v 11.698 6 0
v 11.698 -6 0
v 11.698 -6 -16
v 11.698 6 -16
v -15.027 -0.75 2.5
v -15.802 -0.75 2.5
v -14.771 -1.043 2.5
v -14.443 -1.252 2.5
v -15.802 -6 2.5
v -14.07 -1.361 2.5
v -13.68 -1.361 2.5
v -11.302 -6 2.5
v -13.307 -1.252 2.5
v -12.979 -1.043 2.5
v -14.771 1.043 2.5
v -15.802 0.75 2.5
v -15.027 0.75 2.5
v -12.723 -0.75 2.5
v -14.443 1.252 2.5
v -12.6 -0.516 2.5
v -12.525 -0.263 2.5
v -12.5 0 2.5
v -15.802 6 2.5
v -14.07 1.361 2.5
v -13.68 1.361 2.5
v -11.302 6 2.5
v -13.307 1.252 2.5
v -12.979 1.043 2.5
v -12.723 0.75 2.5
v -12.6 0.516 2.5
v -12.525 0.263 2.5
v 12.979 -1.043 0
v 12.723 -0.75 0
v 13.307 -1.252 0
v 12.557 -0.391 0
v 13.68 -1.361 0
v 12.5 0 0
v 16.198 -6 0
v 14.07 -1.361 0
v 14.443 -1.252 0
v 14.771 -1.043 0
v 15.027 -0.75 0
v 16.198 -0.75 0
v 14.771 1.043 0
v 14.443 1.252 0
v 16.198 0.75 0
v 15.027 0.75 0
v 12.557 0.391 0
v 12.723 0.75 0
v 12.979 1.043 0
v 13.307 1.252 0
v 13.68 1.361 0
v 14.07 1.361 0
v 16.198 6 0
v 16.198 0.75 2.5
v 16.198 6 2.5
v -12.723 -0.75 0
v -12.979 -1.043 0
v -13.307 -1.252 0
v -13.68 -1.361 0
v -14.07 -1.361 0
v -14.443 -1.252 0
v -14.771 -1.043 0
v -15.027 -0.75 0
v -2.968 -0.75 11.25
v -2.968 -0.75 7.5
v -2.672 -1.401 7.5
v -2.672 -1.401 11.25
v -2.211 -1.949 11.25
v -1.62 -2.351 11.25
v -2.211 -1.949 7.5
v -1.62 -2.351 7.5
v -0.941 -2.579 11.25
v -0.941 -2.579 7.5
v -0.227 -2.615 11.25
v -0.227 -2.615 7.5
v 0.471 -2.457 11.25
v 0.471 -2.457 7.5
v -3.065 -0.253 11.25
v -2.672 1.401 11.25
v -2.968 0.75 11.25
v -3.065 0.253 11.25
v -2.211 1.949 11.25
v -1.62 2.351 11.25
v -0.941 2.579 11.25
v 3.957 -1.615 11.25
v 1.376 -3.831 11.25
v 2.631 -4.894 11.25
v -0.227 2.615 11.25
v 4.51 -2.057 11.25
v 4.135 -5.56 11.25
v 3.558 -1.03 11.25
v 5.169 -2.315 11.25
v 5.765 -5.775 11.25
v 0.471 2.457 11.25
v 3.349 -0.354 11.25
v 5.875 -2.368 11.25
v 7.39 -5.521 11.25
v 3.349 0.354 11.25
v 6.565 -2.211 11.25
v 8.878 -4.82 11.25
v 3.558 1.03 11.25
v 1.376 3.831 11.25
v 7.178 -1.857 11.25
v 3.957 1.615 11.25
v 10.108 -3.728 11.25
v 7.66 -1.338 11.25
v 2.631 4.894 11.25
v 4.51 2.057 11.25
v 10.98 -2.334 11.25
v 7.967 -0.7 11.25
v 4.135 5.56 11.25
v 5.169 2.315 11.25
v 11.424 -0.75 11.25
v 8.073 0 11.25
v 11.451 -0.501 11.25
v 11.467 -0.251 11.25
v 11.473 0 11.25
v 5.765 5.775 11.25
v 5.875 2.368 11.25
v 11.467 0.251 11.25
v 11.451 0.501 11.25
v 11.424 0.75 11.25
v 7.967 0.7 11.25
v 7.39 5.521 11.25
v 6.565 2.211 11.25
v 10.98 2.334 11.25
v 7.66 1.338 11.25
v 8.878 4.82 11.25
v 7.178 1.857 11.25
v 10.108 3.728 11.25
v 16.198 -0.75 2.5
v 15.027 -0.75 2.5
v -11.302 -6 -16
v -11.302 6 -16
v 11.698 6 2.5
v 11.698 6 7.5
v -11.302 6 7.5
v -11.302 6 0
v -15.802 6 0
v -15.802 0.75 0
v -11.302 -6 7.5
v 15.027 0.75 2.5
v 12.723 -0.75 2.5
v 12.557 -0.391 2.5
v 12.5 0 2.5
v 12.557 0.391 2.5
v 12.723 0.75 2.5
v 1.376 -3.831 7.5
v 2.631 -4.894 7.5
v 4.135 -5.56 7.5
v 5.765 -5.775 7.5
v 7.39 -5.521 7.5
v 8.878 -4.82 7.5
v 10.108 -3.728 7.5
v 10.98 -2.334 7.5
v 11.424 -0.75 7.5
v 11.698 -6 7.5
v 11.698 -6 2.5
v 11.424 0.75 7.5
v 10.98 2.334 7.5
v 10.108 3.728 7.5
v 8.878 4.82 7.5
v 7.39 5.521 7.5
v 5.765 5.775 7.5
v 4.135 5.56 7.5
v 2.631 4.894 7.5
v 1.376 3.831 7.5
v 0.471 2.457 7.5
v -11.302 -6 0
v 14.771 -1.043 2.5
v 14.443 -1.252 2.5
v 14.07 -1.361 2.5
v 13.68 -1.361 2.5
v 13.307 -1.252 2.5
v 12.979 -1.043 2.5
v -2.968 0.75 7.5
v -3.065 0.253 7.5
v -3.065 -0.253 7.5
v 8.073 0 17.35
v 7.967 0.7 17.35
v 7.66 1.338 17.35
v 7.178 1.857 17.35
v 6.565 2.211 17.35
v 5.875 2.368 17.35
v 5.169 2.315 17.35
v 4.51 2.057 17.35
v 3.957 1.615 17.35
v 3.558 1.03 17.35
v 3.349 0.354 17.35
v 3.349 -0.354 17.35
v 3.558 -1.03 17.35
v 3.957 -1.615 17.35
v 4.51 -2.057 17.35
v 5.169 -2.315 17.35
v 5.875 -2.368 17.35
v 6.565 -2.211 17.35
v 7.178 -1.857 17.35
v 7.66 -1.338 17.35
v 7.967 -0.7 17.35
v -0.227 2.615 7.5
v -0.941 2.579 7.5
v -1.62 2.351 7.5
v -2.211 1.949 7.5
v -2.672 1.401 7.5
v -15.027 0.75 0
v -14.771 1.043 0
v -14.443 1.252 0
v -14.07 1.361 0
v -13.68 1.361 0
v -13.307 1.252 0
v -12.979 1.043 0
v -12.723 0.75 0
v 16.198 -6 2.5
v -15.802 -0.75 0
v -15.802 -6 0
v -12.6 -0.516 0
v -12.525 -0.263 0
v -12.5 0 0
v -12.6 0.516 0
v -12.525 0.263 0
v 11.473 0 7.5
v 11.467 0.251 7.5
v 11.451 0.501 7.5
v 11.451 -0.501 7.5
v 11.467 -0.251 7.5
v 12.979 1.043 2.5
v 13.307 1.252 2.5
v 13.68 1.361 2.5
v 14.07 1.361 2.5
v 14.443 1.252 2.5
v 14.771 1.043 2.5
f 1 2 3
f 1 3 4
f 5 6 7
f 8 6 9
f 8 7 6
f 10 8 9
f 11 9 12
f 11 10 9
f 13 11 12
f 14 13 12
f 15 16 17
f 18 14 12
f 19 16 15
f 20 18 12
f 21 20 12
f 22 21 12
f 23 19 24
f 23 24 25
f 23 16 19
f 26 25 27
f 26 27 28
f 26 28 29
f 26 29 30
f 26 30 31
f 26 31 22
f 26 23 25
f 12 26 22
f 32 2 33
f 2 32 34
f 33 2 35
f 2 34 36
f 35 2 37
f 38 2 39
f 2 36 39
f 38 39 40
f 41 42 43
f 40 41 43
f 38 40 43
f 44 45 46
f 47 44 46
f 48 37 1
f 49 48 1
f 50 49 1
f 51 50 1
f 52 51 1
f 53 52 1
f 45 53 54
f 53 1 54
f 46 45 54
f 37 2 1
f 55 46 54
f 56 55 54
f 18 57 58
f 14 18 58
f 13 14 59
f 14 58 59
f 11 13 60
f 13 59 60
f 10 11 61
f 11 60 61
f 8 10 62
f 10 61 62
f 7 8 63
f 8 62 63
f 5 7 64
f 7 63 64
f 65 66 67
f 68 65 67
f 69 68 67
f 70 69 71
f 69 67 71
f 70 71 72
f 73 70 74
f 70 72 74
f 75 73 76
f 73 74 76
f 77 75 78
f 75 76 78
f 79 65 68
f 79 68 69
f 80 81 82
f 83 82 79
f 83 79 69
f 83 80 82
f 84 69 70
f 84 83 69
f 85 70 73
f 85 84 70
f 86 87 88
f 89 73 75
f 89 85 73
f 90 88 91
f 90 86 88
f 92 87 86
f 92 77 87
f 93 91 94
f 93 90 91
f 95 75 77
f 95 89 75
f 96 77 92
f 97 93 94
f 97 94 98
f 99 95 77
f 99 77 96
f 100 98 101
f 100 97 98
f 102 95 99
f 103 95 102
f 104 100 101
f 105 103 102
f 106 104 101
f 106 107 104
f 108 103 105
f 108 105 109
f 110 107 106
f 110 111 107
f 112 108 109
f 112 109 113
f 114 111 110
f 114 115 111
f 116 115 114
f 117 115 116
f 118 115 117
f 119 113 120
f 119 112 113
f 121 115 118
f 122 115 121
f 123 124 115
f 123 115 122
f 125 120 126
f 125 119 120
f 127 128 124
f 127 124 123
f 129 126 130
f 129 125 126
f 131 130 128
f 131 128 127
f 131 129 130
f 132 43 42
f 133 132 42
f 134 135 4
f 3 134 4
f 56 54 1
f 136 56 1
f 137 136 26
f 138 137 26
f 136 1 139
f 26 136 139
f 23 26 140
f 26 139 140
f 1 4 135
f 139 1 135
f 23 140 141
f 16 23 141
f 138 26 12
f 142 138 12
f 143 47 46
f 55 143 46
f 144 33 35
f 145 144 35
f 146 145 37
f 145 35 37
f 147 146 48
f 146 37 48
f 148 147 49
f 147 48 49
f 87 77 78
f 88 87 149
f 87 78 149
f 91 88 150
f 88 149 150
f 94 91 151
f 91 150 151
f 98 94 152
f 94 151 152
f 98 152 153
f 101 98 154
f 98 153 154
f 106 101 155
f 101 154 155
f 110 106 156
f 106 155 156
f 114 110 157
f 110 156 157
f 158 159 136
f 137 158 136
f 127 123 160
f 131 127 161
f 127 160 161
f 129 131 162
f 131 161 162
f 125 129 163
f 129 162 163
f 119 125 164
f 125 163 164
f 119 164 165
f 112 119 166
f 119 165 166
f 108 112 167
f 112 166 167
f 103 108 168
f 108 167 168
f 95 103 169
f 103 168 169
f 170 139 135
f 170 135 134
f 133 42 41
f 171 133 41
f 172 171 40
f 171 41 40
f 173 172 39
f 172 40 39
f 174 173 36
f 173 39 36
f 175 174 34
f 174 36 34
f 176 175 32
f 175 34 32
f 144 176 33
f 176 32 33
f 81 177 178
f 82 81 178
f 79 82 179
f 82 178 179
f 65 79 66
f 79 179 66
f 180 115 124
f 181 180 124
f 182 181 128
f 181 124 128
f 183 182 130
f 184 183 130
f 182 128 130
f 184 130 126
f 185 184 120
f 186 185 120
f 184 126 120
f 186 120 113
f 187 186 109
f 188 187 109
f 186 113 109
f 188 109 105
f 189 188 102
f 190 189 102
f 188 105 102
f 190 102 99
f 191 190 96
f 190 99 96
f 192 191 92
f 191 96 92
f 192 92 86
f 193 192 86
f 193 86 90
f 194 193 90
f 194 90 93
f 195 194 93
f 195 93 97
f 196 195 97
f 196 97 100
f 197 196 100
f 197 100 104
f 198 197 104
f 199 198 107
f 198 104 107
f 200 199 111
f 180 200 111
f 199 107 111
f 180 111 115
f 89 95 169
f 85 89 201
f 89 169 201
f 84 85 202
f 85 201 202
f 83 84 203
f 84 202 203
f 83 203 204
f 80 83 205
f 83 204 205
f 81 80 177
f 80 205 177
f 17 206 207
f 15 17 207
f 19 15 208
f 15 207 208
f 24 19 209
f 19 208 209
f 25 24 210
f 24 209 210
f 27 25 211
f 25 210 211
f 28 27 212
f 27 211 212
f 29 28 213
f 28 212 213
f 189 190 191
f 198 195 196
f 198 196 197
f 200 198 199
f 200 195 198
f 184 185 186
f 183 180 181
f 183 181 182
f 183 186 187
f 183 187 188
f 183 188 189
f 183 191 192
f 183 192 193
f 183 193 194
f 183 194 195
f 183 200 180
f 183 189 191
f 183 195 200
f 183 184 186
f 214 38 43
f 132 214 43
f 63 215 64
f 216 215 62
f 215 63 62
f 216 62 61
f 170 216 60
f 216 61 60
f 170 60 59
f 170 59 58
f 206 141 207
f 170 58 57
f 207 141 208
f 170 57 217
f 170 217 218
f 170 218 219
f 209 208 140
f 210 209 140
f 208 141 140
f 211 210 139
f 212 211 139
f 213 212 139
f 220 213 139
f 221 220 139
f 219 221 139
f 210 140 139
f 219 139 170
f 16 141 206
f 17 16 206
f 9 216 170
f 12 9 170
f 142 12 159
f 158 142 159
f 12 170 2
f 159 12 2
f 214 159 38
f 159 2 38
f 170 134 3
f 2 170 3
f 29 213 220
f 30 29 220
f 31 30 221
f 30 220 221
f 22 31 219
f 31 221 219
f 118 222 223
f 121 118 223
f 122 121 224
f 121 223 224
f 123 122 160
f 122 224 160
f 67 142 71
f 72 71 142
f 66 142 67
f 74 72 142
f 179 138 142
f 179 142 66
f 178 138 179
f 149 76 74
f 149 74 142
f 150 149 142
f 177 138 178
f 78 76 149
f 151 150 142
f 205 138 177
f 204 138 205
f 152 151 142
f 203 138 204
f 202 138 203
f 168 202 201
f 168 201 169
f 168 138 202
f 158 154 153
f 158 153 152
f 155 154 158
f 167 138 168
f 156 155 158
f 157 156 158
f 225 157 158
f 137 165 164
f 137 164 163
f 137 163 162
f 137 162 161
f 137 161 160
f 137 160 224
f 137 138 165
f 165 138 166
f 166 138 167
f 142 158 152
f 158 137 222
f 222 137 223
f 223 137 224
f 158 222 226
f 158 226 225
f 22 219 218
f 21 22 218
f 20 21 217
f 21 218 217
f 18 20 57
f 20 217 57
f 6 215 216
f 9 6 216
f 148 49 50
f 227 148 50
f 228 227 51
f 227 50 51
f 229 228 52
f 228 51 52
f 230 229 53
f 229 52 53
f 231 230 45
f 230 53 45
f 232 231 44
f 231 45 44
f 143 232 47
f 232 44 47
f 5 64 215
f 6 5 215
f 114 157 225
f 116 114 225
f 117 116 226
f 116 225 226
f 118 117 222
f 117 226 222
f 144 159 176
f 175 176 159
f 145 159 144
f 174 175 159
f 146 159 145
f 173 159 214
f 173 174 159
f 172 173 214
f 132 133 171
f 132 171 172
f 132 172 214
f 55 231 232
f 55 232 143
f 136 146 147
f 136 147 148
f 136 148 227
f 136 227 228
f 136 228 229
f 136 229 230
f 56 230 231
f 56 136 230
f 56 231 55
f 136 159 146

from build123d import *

# Parameters (mm, degrees)
F1_DEPTH      = 2.5
F2_DEPTH      = 11.25
F3_DEPTH      = 7.5
F3_DEPTH_BACK = 16
F4_R          = 2.375
F5_DEPTH      = 6.1


with BuildPart() as f1:
    # F0 (on Top) → F1 (new body)
    with BuildSketch(Plane.XY):
        with BuildLine():
            Line((11.6975234449, 6), (-11.3024765551, 6))
            Line((-11.3024765551, 6), (-11.3024765551, 0.75))
            Line((-11.3024765551, 0.75), (-2.9680530298, 0.75))
            ThreePointArc((-2.9680530298, 0.75), (-1.6195182493, 2.3513057402), (0.4713039327, 2.4570825404))
            ThreePointArc((0.4713039327, 2.4570825404), (6.5869056607, 5.706104124), (11.4236150439, 0.75))
            Line((11.4236150439, 0.75), (11.6975234449, 0.75))
            Line((11.6975234449, 0.75), (11.6975234449, 6))
        make_face()
        with BuildLine():
            Line((-2.9680530298, -0.75), (-11.3024765551, -0.75))
            Line((-11.3024765551, -0.75), (-11.3024765551, -6))
            Line((-11.3024765551, -6), (11.6975234449, -6))
            Line((11.6975234449, -6), (11.6975234449, -0.75))
            Line((11.6975234449, -0.75), (11.4236150439, -0.75))
            ThreePointArc((11.4236150439, -0.75), (6.5869056607, -5.706104124), (0.4713039327, -2.4570825404))
            ThreePointArc((0.4713039327, -2.4570825404), (-1.6195182493, -2.3513057402), (-2.9680530298, -0.75))
        make_face()
        with BuildLine():
            Line((-2.9680530298, 0.75), (-11.3024765551, 0.75))
            Line((-11.3024765551, 0.75), (-11.3024765551, -0.75))
            Line((-11.3024765551, -0.75), (-2.9680530298, -0.75))
            ThreePointArc((-2.9680530298, -0.75), (-3.0774765551, 0), (-2.9680530298, 0.75))
        make_face()
        with BuildLine():
            Line((-11.3024765551, -0.75), (-11.3024765551, 0.75))
            Line((-11.3024765551, 0.75), (-12.7225569428, 0.75))
            ThreePointArc((-12.7225569428, 0.75), (-12.5568129489, 0.3911622403), (-12.5, 0))
            ThreePointArc((-12.5, 0), (-12.5568129489, -0.3911622403), (-12.7225569428, -0.75))
            Line((-12.7225569428, -0.75), (-11.3024765551, -0.75))
        make_face()
        with BuildLine():
            Line((-11.3024765551, 0.75), (-11.3024765551, 6))
            Line((-11.3024765551, 6), (-15.8024765551, 6))
            Line((-15.8024765551, 6), (-15.8024765551, 0.75))
            Line((-15.8024765551, 0.75), (-15.0274430572, 0.75))
            ThreePointArc((-15.0274430572, 0.75), (-13.875, 1.375), (-12.7225569428, 0.75))
            Line((-12.7225569428, 0.75), (-11.3024765551, 0.75))
        make_face()
        with BuildLine():
            Line((-11.3024765551, -6), (-11.3024765551, -0.75))
            Line((-11.3024765551, -0.75), (-12.7225569428, -0.75))
            ThreePointArc((-12.7225569428, -0.75), (-13.875, -1.375), (-15.0274430572, -0.75))
            Line((-15.0274430572, -0.75), (-15.8024765551, -0.75))
            Line((-15.8024765551, -0.75), (-15.8024765551, -6))
            Line((-15.8024765551, -6), (-11.3024765551, -6))
        make_face()
        with BuildLine():
            Line((16.1975234449, 6), (11.6975234449, 6))
            Line((11.6975234449, 6), (11.6975234449, 0.75))
            Line((11.6975234449, 0.75), (12.7225569428, 0.75))
            ThreePointArc((12.7225569428, 0.75), (13.875, 1.375), (15.0274430572, 0.75))
            Line((15.0274430572, 0.75), (16.1975234449, 0.75))
            Line((16.1975234449, 0.75), (16.1975234449, 6))
        make_face()
        with BuildLine():
            Line((12.7225569428, -0.75), (11.6975234449, -0.75))
            Line((11.6975234449, -0.75), (11.6975234449, -6))
            Line((11.6975234449, -6), (16.1975234449, -6))
            Line((16.1975234449, -6), (16.1975234449, -0.75))
            Line((16.1975234449, -0.75), (15.0274430572, -0.75))
            ThreePointArc((15.0274430572, -0.75), (13.875, -1.375), (12.7225569428, -0.75))
        make_face()
        with BuildLine():
            Line((12.7225569428, 0.75), (11.6975234449, 0.75))
            Line((11.6975234449, 0.75), (11.6975234449, -0.75))
            Line((11.6975234449, -0.75), (12.7225569428, -0.75))
            ThreePointArc((12.7225569428, -0.75), (12.5, 0), (12.7225569428, 0.75))
        make_face()
        with BuildLine():
            Line((2.0630999196, 0.75), (11.4236150439, 0.75))
            ThreePointArc((11.4236150439, 0.75), (6.5869056607, 5.706104124), (0.4713039327, 2.4570825404))
            ThreePointArc((0.4713039327, 2.4570825404), (1.4673741627, 1.7901950232), (2.0630999196, 0.75))
        make_face()
        with BuildLine():
            ThreePointArc((0.4713039327, 2.4570825404), (-1.6195182493, 2.3513057402), (-2.9680530298, 0.75))
            Line((-2.9680530298, 0.75), (-0.0285681541, 0.75))
            ThreePointArc((-0.0285681541, 0.75), (0.1552484274, 1.6229025328), (0.4713039327, 2.4570825404))
        make_face()
        with BuildLine():
            Line((-0.0285681541, 0.75), (-2.9680530298, 0.75))
            ThreePointArc((-2.9680530298, 0.75), (-3.0774765551, 0), (-2.9680530298, -0.75))
            Line((-2.9680530298, -0.75), (-0.0285681541, -0.75))
            ThreePointArc((-0.0285681541, -0.75), (-0.0774765551, 0), (-0.0285681541, 0.75))
        make_face()
        with BuildLine():
            Line((-0.0285681541, -0.75), (-2.9680530298, -0.75))
            ThreePointArc((-2.9680530298, -0.75), (-1.6195182493, -2.3513057402), (0.4713039327, -2.4570825404))
            ThreePointArc((0.4713039327, -2.4570825404), (0.1552484274, -1.6229025328), (-0.0285681541, -0.75))
        make_face()
        with BuildLine():
            Line((2.0630999196, -0.75), (-0.0285681541, -0.75))
            ThreePointArc((-0.0285681541, -0.75), (0.1552484274, -1.6229025328), (0.4713039327, -2.4570825404))
            ThreePointArc((0.4713039327, -2.4570825404), (1.4673741627, -1.7901950232), (2.0630999196, -0.75))
        make_face()
        with BuildLine():
            Line((2.0630999196, 0.75), (-0.0285681541, 0.75))
            ThreePointArc((-0.0285681541, 0.75), (-0.0774765551, 0), (-0.0285681541, -0.75))
            Line((-0.0285681541, -0.75), (2.0630999196, -0.75))
            ThreePointArc((2.0630999196, -0.75), (2.1450235167, -0.3789701531), (2.1725234449, 0))
            ThreePointArc((2.1725234449, 0), (2.1450235167, 0.3789701531), (2.0630999196, 0.75))
        make_face()
        with BuildLine():
            ThreePointArc((0.4713039327, 2.4570825404), (0.1552484274, 1.6229025328), (-0.0285681541, 0.75))
            Line((-0.0285681541, 0.75), (2.0630999196, 0.75))
            ThreePointArc((2.0630999196, 0.75), (1.4673741627, 1.7901950232), (0.4713039327, 2.4570825404))
        make_face()
        with BuildLine():
            ThreePointArc((11.4725234449, 0), (11.4602833733, 0.375796498), (11.4236150439, 0.75))
            Line((11.4236150439, 0.75), (2.0630999196, 0.75))
            ThreePointArc((2.0630999196, 0.75), (2.1450235167, 0.3789701531), (2.1725234449, 0))
            ThreePointArc((2.1725234449, 0), (2.1450235167, -0.3789701531), (2.0630999196, -0.75))
            Line((2.0630999196, -0.75), (11.4236150439, -0.75))
            ThreePointArc((11.4236150439, -0.75), (11.4602833733, -0.375796498), (11.4725234449, 0))
        make_face()
        with BuildLine():
            ThreePointArc((0.4713039327, -2.4570825404), (6.5869056607, -5.706104124), (11.4236150439, -0.75))
            Line((11.4236150439, -0.75), (2.0630999196, -0.75))
            ThreePointArc((2.0630999196, -0.75), (1.4673741627, -1.7901950232), (0.4713039327, -2.4570825404))
        make_face()
        with BuildLine():
            Line((11.6975234449, -0.75), (11.6975234449, 0.75))
            Line((11.6975234449, 0.75), (11.4236150439, 0.75))
            ThreePointArc((11.4236150439, 0.75), (11.4602833733, 0.375796498), (11.4725234449, 0))
            ThreePointArc((11.4725234449, 0), (11.4602833733, -0.375796498), (11.4236150439, -0.75))
            Line((11.4236150439, -0.75), (11.6975234449, -0.75))
        make_face()
    extrude(amount=F1_DEPTH)

    # F0 (on Top) → F2 (join)
    with BuildSketch(Plane.XY):
        with BuildLine():
            Line((2.0630999196, 0.75), (11.4236150439, 0.75))
            ThreePointArc((11.4236150439, 0.75), (6.5869056607, 5.706104124), (0.4713039327, 2.4570825404))
            ThreePointArc((0.4713039327, 2.4570825404), (1.4673741627, 1.7901950232), (2.0630999196, 0.75))
        make_face()
        with BuildLine():
            ThreePointArc((0.4713039327, -2.4570825404), (6.5869056607, -5.706104124), (11.4236150439, -0.75))
            Line((11.4236150439, -0.75), (2.0630999196, -0.75))
            ThreePointArc((2.0630999196, -0.75), (1.4673741627, -1.7901950232), (0.4713039327, -2.4570825404))
        make_face()
        with BuildLine():
            ThreePointArc((11.4725234449, 0), (11.4602833733, 0.375796498), (11.4236150439, 0.75))
            Line((11.4236150439, 0.75), (2.0630999196, 0.75))
            ThreePointArc((2.0630999196, 0.75), (2.1450235167, 0.3789701531), (2.1725234449, 0))
            ThreePointArc((2.1725234449, 0), (2.1450235167, -0.3789701531), (2.0630999196, -0.75))
            Line((2.0630999196, -0.75), (11.4236150439, -0.75))
            ThreePointArc((11.4236150439, -0.75), (11.4602833733, -0.375796498), (11.4725234449, 0))
        make_face()
        with BuildLine():
            Line((2.0630999196, 0.75), (-0.0285681541, 0.75))
            ThreePointArc((-0.0285681541, 0.75), (-0.0774765551, 0), (-0.0285681541, -0.75))
            Line((-0.0285681541, -0.75), (2.0630999196, -0.75))
            ThreePointArc((2.0630999196, -0.75), (2.1450235167, -0.3789701531), (2.1725234449, 0))
            ThreePointArc((2.1725234449, 0), (2.1450235167, 0.3789701531), (2.0630999196, 0.75))
        make_face()
        with BuildLine():
            ThreePointArc((0.4713039327, 2.4570825404), (0.1552484274, 1.6229025328), (-0.0285681541, 0.75))
            Line((-0.0285681541, 0.75), (2.0630999196, 0.75))
            ThreePointArc((2.0630999196, 0.75), (1.4673741627, 1.7901950232), (0.4713039327, 2.4570825404))
        make_face()
        with BuildLine():
            ThreePointArc((0.4713039327, 2.4570825404), (-1.6195182493, 2.3513057402), (-2.9680530298, 0.75))
            Line((-2.9680530298, 0.75), (-0.0285681541, 0.75))
            ThreePointArc((-0.0285681541, 0.75), (0.1552484274, 1.6229025328), (0.4713039327, 2.4570825404))
        make_face()
        with BuildLine():
            Line((-0.0285681541, 0.75), (-2.9680530298, 0.75))
            ThreePointArc((-2.9680530298, 0.75), (-3.0774765551, 0), (-2.9680530298, -0.75))
            Line((-2.9680530298, -0.75), (-0.0285681541, -0.75))
            ThreePointArc((-0.0285681541, -0.75), (-0.0774765551, 0), (-0.0285681541, 0.75))
        make_face()
        with BuildLine():
            Line((-0.0285681541, -0.75), (-2.9680530298, -0.75))
            ThreePointArc((-2.9680530298, -0.75), (-1.6195182493, -2.3513057402), (0.4713039327, -2.4570825404))
            ThreePointArc((0.4713039327, -2.4570825404), (0.1552484274, -1.6229025328), (-0.0285681541, -0.75))
        make_face()
        with BuildLine():
            Line((2.0630999196, -0.75), (-0.0285681541, -0.75))
            ThreePointArc((-0.0285681541, -0.75), (0.1552484274, -1.6229025328), (0.4713039327, -2.4570825404))
            ThreePointArc((0.4713039327, -2.4570825404), (1.4673741627, -1.7901950232), (2.0630999196, -0.75))
        make_face()
    extrude(amount=F2_DEPTH)

    # F0 (on Top) → F3 (join, two sides)
    with BuildSketch(Plane.XY) as f3_sk:
        with BuildLine():
            Line((11.6975234449, 6), (-11.3024765551, 6))
            Line((-11.3024765551, 6), (-11.3024765551, 0.75))
            Line((-11.3024765551, 0.75), (-2.9680530298, 0.75))
            ThreePointArc((-2.9680530298, 0.75), (-1.6195182493, 2.3513057402), (0.4713039327, 2.4570825404))
            ThreePointArc((0.4713039327, 2.4570825404), (6.5869056607, 5.706104124), (11.4236150439, 0.75))
            Line((11.4236150439, 0.75), (11.6975234449, 0.75))
            Line((11.6975234449, 0.75), (11.6975234449, 6))
        make_face()
        with BuildLine():
            Line((-2.9680530298, -0.75), (-11.3024765551, -0.75))
            Line((-11.3024765551, -0.75), (-11.3024765551, -6))
            Line((-11.3024765551, -6), (11.6975234449, -6))
            Line((11.6975234449, -6), (11.6975234449, -0.75))
            Line((11.6975234449, -0.75), (11.4236150439, -0.75))
            ThreePointArc((11.4236150439, -0.75), (6.5869056607, -5.706104124), (0.4713039327, -2.4570825404))
            ThreePointArc((0.4713039327, -2.4570825404), (-1.6195182493, -2.3513057402), (-2.9680530298, -0.75))
        make_face()
        with BuildLine():
            Line((-2.9680530298, 0.75), (-11.3024765551, 0.75))
            Line((-11.3024765551, 0.75), (-11.3024765551, -0.75))
            Line((-11.3024765551, -0.75), (-2.9680530298, -0.75))
            ThreePointArc((-2.9680530298, -0.75), (-3.0774765551, 0), (-2.9680530298, 0.75))
        make_face()
        with BuildLine():
            Line((-0.0285681541, 0.75), (-2.9680530298, 0.75))
            ThreePointArc((-2.9680530298, 0.75), (-3.0774765551, 0), (-2.9680530298, -0.75))
            Line((-2.9680530298, -0.75), (-0.0285681541, -0.75))
            ThreePointArc((-0.0285681541, -0.75), (-0.0774765551, 0), (-0.0285681541, 0.75))
        make_face()
        with BuildLine():
            ThreePointArc((0.4713039327, 2.4570825404), (-1.6195182493, 2.3513057402), (-2.9680530298, 0.75))
            Line((-2.9680530298, 0.75), (-0.0285681541, 0.75))
            ThreePointArc((-0.0285681541, 0.75), (0.1552484274, 1.6229025328), (0.4713039327, 2.4570825404))
        make_face()
        with BuildLine():
            Line((-0.0285681541, -0.75), (-2.9680530298, -0.75))
            ThreePointArc((-2.9680530298, -0.75), (-1.6195182493, -2.3513057402), (0.4713039327, -2.4570825404))
            ThreePointArc((0.4713039327, -2.4570825404), (0.1552484274, -1.6229025328), (-0.0285681541, -0.75))
        make_face()
        with BuildLine():
            Line((2.0630999196, -0.75), (-0.0285681541, -0.75))
            ThreePointArc((-0.0285681541, -0.75), (0.1552484274, -1.6229025328), (0.4713039327, -2.4570825404))
            ThreePointArc((0.4713039327, -2.4570825404), (1.4673741627, -1.7901950232), (2.0630999196, -0.75))
        make_face()
        with BuildLine():
            Line((2.0630999196, 0.75), (-0.0285681541, 0.75))
            ThreePointArc((-0.0285681541, 0.75), (-0.0774765551, 0), (-0.0285681541, -0.75))
            Line((-0.0285681541, -0.75), (2.0630999196, -0.75))
            ThreePointArc((2.0630999196, -0.75), (2.1450235167, -0.3789701531), (2.1725234449, 0))
            ThreePointArc((2.1725234449, 0), (2.1450235167, 0.3789701531), (2.0630999196, 0.75))
        make_face()
        with BuildLine():
            ThreePointArc((0.4713039327, 2.4570825404), (0.1552484274, 1.6229025328), (-0.0285681541, 0.75))
            Line((-0.0285681541, 0.75), (2.0630999196, 0.75))
            ThreePointArc((2.0630999196, 0.75), (1.4673741627, 1.7901950232), (0.4713039327, 2.4570825404))
        make_face()
        with BuildLine():
            Line((2.0630999196, 0.75), (11.4236150439, 0.75))
            ThreePointArc((11.4236150439, 0.75), (6.5869056607, 5.706104124), (0.4713039327, 2.4570825404))
            ThreePointArc((0.4713039327, 2.4570825404), (1.4673741627, 1.7901950232), (2.0630999196, 0.75))
        make_face()
        with BuildLine():
            ThreePointArc((0.4713039327, -2.4570825404), (6.5869056607, -5.706104124), (11.4236150439, -0.75))
            Line((11.4236150439, -0.75), (2.0630999196, -0.75))
            ThreePointArc((2.0630999196, -0.75), (1.4673741627, -1.7901950232), (0.4713039327, -2.4570825404))
        make_face()
        with BuildLine():
            ThreePointArc((11.4725234449, 0), (11.4602833733, 0.375796498), (11.4236150439, 0.75))
            Line((11.4236150439, 0.75), (2.0630999196, 0.75))
            ThreePointArc((2.0630999196, 0.75), (2.1450235167, 0.3789701531), (2.1725234449, 0))
            ThreePointArc((2.1725234449, 0), (2.1450235167, -0.3789701531), (2.0630999196, -0.75))
            Line((2.0630999196, -0.75), (11.4236150439, -0.75))
            ThreePointArc((11.4236150439, -0.75), (11.4602833733, -0.375796498), (11.4725234449, 0))
        make_face()
        with BuildLine():
            Line((11.6975234449, -0.75), (11.6975234449, 0.75))
            Line((11.6975234449, 0.75), (11.4236150439, 0.75))
            ThreePointArc((11.4236150439, 0.75), (11.4602833733, 0.375796498), (11.4725234449, 0))
            ThreePointArc((11.4725234449, 0), (11.4602833733, -0.375796498), (11.4236150439, -0.75))
            Line((11.4236150439, -0.75), (11.6975234449, -0.75))
        make_face()
    extrude(amount=F3_DEPTH)
    extrude(f3_sk.sketch, amount=-F3_DEPTH_BACK)

    # F4 (on face) → F5 (join)
    with BuildSketch(Plane.XY.offset(11.25)):
        with Locations((5.6975234449, 0)):
            Circle(F4_R)
    extrude(amount=F5_DEPTH)


solid = f1.part
